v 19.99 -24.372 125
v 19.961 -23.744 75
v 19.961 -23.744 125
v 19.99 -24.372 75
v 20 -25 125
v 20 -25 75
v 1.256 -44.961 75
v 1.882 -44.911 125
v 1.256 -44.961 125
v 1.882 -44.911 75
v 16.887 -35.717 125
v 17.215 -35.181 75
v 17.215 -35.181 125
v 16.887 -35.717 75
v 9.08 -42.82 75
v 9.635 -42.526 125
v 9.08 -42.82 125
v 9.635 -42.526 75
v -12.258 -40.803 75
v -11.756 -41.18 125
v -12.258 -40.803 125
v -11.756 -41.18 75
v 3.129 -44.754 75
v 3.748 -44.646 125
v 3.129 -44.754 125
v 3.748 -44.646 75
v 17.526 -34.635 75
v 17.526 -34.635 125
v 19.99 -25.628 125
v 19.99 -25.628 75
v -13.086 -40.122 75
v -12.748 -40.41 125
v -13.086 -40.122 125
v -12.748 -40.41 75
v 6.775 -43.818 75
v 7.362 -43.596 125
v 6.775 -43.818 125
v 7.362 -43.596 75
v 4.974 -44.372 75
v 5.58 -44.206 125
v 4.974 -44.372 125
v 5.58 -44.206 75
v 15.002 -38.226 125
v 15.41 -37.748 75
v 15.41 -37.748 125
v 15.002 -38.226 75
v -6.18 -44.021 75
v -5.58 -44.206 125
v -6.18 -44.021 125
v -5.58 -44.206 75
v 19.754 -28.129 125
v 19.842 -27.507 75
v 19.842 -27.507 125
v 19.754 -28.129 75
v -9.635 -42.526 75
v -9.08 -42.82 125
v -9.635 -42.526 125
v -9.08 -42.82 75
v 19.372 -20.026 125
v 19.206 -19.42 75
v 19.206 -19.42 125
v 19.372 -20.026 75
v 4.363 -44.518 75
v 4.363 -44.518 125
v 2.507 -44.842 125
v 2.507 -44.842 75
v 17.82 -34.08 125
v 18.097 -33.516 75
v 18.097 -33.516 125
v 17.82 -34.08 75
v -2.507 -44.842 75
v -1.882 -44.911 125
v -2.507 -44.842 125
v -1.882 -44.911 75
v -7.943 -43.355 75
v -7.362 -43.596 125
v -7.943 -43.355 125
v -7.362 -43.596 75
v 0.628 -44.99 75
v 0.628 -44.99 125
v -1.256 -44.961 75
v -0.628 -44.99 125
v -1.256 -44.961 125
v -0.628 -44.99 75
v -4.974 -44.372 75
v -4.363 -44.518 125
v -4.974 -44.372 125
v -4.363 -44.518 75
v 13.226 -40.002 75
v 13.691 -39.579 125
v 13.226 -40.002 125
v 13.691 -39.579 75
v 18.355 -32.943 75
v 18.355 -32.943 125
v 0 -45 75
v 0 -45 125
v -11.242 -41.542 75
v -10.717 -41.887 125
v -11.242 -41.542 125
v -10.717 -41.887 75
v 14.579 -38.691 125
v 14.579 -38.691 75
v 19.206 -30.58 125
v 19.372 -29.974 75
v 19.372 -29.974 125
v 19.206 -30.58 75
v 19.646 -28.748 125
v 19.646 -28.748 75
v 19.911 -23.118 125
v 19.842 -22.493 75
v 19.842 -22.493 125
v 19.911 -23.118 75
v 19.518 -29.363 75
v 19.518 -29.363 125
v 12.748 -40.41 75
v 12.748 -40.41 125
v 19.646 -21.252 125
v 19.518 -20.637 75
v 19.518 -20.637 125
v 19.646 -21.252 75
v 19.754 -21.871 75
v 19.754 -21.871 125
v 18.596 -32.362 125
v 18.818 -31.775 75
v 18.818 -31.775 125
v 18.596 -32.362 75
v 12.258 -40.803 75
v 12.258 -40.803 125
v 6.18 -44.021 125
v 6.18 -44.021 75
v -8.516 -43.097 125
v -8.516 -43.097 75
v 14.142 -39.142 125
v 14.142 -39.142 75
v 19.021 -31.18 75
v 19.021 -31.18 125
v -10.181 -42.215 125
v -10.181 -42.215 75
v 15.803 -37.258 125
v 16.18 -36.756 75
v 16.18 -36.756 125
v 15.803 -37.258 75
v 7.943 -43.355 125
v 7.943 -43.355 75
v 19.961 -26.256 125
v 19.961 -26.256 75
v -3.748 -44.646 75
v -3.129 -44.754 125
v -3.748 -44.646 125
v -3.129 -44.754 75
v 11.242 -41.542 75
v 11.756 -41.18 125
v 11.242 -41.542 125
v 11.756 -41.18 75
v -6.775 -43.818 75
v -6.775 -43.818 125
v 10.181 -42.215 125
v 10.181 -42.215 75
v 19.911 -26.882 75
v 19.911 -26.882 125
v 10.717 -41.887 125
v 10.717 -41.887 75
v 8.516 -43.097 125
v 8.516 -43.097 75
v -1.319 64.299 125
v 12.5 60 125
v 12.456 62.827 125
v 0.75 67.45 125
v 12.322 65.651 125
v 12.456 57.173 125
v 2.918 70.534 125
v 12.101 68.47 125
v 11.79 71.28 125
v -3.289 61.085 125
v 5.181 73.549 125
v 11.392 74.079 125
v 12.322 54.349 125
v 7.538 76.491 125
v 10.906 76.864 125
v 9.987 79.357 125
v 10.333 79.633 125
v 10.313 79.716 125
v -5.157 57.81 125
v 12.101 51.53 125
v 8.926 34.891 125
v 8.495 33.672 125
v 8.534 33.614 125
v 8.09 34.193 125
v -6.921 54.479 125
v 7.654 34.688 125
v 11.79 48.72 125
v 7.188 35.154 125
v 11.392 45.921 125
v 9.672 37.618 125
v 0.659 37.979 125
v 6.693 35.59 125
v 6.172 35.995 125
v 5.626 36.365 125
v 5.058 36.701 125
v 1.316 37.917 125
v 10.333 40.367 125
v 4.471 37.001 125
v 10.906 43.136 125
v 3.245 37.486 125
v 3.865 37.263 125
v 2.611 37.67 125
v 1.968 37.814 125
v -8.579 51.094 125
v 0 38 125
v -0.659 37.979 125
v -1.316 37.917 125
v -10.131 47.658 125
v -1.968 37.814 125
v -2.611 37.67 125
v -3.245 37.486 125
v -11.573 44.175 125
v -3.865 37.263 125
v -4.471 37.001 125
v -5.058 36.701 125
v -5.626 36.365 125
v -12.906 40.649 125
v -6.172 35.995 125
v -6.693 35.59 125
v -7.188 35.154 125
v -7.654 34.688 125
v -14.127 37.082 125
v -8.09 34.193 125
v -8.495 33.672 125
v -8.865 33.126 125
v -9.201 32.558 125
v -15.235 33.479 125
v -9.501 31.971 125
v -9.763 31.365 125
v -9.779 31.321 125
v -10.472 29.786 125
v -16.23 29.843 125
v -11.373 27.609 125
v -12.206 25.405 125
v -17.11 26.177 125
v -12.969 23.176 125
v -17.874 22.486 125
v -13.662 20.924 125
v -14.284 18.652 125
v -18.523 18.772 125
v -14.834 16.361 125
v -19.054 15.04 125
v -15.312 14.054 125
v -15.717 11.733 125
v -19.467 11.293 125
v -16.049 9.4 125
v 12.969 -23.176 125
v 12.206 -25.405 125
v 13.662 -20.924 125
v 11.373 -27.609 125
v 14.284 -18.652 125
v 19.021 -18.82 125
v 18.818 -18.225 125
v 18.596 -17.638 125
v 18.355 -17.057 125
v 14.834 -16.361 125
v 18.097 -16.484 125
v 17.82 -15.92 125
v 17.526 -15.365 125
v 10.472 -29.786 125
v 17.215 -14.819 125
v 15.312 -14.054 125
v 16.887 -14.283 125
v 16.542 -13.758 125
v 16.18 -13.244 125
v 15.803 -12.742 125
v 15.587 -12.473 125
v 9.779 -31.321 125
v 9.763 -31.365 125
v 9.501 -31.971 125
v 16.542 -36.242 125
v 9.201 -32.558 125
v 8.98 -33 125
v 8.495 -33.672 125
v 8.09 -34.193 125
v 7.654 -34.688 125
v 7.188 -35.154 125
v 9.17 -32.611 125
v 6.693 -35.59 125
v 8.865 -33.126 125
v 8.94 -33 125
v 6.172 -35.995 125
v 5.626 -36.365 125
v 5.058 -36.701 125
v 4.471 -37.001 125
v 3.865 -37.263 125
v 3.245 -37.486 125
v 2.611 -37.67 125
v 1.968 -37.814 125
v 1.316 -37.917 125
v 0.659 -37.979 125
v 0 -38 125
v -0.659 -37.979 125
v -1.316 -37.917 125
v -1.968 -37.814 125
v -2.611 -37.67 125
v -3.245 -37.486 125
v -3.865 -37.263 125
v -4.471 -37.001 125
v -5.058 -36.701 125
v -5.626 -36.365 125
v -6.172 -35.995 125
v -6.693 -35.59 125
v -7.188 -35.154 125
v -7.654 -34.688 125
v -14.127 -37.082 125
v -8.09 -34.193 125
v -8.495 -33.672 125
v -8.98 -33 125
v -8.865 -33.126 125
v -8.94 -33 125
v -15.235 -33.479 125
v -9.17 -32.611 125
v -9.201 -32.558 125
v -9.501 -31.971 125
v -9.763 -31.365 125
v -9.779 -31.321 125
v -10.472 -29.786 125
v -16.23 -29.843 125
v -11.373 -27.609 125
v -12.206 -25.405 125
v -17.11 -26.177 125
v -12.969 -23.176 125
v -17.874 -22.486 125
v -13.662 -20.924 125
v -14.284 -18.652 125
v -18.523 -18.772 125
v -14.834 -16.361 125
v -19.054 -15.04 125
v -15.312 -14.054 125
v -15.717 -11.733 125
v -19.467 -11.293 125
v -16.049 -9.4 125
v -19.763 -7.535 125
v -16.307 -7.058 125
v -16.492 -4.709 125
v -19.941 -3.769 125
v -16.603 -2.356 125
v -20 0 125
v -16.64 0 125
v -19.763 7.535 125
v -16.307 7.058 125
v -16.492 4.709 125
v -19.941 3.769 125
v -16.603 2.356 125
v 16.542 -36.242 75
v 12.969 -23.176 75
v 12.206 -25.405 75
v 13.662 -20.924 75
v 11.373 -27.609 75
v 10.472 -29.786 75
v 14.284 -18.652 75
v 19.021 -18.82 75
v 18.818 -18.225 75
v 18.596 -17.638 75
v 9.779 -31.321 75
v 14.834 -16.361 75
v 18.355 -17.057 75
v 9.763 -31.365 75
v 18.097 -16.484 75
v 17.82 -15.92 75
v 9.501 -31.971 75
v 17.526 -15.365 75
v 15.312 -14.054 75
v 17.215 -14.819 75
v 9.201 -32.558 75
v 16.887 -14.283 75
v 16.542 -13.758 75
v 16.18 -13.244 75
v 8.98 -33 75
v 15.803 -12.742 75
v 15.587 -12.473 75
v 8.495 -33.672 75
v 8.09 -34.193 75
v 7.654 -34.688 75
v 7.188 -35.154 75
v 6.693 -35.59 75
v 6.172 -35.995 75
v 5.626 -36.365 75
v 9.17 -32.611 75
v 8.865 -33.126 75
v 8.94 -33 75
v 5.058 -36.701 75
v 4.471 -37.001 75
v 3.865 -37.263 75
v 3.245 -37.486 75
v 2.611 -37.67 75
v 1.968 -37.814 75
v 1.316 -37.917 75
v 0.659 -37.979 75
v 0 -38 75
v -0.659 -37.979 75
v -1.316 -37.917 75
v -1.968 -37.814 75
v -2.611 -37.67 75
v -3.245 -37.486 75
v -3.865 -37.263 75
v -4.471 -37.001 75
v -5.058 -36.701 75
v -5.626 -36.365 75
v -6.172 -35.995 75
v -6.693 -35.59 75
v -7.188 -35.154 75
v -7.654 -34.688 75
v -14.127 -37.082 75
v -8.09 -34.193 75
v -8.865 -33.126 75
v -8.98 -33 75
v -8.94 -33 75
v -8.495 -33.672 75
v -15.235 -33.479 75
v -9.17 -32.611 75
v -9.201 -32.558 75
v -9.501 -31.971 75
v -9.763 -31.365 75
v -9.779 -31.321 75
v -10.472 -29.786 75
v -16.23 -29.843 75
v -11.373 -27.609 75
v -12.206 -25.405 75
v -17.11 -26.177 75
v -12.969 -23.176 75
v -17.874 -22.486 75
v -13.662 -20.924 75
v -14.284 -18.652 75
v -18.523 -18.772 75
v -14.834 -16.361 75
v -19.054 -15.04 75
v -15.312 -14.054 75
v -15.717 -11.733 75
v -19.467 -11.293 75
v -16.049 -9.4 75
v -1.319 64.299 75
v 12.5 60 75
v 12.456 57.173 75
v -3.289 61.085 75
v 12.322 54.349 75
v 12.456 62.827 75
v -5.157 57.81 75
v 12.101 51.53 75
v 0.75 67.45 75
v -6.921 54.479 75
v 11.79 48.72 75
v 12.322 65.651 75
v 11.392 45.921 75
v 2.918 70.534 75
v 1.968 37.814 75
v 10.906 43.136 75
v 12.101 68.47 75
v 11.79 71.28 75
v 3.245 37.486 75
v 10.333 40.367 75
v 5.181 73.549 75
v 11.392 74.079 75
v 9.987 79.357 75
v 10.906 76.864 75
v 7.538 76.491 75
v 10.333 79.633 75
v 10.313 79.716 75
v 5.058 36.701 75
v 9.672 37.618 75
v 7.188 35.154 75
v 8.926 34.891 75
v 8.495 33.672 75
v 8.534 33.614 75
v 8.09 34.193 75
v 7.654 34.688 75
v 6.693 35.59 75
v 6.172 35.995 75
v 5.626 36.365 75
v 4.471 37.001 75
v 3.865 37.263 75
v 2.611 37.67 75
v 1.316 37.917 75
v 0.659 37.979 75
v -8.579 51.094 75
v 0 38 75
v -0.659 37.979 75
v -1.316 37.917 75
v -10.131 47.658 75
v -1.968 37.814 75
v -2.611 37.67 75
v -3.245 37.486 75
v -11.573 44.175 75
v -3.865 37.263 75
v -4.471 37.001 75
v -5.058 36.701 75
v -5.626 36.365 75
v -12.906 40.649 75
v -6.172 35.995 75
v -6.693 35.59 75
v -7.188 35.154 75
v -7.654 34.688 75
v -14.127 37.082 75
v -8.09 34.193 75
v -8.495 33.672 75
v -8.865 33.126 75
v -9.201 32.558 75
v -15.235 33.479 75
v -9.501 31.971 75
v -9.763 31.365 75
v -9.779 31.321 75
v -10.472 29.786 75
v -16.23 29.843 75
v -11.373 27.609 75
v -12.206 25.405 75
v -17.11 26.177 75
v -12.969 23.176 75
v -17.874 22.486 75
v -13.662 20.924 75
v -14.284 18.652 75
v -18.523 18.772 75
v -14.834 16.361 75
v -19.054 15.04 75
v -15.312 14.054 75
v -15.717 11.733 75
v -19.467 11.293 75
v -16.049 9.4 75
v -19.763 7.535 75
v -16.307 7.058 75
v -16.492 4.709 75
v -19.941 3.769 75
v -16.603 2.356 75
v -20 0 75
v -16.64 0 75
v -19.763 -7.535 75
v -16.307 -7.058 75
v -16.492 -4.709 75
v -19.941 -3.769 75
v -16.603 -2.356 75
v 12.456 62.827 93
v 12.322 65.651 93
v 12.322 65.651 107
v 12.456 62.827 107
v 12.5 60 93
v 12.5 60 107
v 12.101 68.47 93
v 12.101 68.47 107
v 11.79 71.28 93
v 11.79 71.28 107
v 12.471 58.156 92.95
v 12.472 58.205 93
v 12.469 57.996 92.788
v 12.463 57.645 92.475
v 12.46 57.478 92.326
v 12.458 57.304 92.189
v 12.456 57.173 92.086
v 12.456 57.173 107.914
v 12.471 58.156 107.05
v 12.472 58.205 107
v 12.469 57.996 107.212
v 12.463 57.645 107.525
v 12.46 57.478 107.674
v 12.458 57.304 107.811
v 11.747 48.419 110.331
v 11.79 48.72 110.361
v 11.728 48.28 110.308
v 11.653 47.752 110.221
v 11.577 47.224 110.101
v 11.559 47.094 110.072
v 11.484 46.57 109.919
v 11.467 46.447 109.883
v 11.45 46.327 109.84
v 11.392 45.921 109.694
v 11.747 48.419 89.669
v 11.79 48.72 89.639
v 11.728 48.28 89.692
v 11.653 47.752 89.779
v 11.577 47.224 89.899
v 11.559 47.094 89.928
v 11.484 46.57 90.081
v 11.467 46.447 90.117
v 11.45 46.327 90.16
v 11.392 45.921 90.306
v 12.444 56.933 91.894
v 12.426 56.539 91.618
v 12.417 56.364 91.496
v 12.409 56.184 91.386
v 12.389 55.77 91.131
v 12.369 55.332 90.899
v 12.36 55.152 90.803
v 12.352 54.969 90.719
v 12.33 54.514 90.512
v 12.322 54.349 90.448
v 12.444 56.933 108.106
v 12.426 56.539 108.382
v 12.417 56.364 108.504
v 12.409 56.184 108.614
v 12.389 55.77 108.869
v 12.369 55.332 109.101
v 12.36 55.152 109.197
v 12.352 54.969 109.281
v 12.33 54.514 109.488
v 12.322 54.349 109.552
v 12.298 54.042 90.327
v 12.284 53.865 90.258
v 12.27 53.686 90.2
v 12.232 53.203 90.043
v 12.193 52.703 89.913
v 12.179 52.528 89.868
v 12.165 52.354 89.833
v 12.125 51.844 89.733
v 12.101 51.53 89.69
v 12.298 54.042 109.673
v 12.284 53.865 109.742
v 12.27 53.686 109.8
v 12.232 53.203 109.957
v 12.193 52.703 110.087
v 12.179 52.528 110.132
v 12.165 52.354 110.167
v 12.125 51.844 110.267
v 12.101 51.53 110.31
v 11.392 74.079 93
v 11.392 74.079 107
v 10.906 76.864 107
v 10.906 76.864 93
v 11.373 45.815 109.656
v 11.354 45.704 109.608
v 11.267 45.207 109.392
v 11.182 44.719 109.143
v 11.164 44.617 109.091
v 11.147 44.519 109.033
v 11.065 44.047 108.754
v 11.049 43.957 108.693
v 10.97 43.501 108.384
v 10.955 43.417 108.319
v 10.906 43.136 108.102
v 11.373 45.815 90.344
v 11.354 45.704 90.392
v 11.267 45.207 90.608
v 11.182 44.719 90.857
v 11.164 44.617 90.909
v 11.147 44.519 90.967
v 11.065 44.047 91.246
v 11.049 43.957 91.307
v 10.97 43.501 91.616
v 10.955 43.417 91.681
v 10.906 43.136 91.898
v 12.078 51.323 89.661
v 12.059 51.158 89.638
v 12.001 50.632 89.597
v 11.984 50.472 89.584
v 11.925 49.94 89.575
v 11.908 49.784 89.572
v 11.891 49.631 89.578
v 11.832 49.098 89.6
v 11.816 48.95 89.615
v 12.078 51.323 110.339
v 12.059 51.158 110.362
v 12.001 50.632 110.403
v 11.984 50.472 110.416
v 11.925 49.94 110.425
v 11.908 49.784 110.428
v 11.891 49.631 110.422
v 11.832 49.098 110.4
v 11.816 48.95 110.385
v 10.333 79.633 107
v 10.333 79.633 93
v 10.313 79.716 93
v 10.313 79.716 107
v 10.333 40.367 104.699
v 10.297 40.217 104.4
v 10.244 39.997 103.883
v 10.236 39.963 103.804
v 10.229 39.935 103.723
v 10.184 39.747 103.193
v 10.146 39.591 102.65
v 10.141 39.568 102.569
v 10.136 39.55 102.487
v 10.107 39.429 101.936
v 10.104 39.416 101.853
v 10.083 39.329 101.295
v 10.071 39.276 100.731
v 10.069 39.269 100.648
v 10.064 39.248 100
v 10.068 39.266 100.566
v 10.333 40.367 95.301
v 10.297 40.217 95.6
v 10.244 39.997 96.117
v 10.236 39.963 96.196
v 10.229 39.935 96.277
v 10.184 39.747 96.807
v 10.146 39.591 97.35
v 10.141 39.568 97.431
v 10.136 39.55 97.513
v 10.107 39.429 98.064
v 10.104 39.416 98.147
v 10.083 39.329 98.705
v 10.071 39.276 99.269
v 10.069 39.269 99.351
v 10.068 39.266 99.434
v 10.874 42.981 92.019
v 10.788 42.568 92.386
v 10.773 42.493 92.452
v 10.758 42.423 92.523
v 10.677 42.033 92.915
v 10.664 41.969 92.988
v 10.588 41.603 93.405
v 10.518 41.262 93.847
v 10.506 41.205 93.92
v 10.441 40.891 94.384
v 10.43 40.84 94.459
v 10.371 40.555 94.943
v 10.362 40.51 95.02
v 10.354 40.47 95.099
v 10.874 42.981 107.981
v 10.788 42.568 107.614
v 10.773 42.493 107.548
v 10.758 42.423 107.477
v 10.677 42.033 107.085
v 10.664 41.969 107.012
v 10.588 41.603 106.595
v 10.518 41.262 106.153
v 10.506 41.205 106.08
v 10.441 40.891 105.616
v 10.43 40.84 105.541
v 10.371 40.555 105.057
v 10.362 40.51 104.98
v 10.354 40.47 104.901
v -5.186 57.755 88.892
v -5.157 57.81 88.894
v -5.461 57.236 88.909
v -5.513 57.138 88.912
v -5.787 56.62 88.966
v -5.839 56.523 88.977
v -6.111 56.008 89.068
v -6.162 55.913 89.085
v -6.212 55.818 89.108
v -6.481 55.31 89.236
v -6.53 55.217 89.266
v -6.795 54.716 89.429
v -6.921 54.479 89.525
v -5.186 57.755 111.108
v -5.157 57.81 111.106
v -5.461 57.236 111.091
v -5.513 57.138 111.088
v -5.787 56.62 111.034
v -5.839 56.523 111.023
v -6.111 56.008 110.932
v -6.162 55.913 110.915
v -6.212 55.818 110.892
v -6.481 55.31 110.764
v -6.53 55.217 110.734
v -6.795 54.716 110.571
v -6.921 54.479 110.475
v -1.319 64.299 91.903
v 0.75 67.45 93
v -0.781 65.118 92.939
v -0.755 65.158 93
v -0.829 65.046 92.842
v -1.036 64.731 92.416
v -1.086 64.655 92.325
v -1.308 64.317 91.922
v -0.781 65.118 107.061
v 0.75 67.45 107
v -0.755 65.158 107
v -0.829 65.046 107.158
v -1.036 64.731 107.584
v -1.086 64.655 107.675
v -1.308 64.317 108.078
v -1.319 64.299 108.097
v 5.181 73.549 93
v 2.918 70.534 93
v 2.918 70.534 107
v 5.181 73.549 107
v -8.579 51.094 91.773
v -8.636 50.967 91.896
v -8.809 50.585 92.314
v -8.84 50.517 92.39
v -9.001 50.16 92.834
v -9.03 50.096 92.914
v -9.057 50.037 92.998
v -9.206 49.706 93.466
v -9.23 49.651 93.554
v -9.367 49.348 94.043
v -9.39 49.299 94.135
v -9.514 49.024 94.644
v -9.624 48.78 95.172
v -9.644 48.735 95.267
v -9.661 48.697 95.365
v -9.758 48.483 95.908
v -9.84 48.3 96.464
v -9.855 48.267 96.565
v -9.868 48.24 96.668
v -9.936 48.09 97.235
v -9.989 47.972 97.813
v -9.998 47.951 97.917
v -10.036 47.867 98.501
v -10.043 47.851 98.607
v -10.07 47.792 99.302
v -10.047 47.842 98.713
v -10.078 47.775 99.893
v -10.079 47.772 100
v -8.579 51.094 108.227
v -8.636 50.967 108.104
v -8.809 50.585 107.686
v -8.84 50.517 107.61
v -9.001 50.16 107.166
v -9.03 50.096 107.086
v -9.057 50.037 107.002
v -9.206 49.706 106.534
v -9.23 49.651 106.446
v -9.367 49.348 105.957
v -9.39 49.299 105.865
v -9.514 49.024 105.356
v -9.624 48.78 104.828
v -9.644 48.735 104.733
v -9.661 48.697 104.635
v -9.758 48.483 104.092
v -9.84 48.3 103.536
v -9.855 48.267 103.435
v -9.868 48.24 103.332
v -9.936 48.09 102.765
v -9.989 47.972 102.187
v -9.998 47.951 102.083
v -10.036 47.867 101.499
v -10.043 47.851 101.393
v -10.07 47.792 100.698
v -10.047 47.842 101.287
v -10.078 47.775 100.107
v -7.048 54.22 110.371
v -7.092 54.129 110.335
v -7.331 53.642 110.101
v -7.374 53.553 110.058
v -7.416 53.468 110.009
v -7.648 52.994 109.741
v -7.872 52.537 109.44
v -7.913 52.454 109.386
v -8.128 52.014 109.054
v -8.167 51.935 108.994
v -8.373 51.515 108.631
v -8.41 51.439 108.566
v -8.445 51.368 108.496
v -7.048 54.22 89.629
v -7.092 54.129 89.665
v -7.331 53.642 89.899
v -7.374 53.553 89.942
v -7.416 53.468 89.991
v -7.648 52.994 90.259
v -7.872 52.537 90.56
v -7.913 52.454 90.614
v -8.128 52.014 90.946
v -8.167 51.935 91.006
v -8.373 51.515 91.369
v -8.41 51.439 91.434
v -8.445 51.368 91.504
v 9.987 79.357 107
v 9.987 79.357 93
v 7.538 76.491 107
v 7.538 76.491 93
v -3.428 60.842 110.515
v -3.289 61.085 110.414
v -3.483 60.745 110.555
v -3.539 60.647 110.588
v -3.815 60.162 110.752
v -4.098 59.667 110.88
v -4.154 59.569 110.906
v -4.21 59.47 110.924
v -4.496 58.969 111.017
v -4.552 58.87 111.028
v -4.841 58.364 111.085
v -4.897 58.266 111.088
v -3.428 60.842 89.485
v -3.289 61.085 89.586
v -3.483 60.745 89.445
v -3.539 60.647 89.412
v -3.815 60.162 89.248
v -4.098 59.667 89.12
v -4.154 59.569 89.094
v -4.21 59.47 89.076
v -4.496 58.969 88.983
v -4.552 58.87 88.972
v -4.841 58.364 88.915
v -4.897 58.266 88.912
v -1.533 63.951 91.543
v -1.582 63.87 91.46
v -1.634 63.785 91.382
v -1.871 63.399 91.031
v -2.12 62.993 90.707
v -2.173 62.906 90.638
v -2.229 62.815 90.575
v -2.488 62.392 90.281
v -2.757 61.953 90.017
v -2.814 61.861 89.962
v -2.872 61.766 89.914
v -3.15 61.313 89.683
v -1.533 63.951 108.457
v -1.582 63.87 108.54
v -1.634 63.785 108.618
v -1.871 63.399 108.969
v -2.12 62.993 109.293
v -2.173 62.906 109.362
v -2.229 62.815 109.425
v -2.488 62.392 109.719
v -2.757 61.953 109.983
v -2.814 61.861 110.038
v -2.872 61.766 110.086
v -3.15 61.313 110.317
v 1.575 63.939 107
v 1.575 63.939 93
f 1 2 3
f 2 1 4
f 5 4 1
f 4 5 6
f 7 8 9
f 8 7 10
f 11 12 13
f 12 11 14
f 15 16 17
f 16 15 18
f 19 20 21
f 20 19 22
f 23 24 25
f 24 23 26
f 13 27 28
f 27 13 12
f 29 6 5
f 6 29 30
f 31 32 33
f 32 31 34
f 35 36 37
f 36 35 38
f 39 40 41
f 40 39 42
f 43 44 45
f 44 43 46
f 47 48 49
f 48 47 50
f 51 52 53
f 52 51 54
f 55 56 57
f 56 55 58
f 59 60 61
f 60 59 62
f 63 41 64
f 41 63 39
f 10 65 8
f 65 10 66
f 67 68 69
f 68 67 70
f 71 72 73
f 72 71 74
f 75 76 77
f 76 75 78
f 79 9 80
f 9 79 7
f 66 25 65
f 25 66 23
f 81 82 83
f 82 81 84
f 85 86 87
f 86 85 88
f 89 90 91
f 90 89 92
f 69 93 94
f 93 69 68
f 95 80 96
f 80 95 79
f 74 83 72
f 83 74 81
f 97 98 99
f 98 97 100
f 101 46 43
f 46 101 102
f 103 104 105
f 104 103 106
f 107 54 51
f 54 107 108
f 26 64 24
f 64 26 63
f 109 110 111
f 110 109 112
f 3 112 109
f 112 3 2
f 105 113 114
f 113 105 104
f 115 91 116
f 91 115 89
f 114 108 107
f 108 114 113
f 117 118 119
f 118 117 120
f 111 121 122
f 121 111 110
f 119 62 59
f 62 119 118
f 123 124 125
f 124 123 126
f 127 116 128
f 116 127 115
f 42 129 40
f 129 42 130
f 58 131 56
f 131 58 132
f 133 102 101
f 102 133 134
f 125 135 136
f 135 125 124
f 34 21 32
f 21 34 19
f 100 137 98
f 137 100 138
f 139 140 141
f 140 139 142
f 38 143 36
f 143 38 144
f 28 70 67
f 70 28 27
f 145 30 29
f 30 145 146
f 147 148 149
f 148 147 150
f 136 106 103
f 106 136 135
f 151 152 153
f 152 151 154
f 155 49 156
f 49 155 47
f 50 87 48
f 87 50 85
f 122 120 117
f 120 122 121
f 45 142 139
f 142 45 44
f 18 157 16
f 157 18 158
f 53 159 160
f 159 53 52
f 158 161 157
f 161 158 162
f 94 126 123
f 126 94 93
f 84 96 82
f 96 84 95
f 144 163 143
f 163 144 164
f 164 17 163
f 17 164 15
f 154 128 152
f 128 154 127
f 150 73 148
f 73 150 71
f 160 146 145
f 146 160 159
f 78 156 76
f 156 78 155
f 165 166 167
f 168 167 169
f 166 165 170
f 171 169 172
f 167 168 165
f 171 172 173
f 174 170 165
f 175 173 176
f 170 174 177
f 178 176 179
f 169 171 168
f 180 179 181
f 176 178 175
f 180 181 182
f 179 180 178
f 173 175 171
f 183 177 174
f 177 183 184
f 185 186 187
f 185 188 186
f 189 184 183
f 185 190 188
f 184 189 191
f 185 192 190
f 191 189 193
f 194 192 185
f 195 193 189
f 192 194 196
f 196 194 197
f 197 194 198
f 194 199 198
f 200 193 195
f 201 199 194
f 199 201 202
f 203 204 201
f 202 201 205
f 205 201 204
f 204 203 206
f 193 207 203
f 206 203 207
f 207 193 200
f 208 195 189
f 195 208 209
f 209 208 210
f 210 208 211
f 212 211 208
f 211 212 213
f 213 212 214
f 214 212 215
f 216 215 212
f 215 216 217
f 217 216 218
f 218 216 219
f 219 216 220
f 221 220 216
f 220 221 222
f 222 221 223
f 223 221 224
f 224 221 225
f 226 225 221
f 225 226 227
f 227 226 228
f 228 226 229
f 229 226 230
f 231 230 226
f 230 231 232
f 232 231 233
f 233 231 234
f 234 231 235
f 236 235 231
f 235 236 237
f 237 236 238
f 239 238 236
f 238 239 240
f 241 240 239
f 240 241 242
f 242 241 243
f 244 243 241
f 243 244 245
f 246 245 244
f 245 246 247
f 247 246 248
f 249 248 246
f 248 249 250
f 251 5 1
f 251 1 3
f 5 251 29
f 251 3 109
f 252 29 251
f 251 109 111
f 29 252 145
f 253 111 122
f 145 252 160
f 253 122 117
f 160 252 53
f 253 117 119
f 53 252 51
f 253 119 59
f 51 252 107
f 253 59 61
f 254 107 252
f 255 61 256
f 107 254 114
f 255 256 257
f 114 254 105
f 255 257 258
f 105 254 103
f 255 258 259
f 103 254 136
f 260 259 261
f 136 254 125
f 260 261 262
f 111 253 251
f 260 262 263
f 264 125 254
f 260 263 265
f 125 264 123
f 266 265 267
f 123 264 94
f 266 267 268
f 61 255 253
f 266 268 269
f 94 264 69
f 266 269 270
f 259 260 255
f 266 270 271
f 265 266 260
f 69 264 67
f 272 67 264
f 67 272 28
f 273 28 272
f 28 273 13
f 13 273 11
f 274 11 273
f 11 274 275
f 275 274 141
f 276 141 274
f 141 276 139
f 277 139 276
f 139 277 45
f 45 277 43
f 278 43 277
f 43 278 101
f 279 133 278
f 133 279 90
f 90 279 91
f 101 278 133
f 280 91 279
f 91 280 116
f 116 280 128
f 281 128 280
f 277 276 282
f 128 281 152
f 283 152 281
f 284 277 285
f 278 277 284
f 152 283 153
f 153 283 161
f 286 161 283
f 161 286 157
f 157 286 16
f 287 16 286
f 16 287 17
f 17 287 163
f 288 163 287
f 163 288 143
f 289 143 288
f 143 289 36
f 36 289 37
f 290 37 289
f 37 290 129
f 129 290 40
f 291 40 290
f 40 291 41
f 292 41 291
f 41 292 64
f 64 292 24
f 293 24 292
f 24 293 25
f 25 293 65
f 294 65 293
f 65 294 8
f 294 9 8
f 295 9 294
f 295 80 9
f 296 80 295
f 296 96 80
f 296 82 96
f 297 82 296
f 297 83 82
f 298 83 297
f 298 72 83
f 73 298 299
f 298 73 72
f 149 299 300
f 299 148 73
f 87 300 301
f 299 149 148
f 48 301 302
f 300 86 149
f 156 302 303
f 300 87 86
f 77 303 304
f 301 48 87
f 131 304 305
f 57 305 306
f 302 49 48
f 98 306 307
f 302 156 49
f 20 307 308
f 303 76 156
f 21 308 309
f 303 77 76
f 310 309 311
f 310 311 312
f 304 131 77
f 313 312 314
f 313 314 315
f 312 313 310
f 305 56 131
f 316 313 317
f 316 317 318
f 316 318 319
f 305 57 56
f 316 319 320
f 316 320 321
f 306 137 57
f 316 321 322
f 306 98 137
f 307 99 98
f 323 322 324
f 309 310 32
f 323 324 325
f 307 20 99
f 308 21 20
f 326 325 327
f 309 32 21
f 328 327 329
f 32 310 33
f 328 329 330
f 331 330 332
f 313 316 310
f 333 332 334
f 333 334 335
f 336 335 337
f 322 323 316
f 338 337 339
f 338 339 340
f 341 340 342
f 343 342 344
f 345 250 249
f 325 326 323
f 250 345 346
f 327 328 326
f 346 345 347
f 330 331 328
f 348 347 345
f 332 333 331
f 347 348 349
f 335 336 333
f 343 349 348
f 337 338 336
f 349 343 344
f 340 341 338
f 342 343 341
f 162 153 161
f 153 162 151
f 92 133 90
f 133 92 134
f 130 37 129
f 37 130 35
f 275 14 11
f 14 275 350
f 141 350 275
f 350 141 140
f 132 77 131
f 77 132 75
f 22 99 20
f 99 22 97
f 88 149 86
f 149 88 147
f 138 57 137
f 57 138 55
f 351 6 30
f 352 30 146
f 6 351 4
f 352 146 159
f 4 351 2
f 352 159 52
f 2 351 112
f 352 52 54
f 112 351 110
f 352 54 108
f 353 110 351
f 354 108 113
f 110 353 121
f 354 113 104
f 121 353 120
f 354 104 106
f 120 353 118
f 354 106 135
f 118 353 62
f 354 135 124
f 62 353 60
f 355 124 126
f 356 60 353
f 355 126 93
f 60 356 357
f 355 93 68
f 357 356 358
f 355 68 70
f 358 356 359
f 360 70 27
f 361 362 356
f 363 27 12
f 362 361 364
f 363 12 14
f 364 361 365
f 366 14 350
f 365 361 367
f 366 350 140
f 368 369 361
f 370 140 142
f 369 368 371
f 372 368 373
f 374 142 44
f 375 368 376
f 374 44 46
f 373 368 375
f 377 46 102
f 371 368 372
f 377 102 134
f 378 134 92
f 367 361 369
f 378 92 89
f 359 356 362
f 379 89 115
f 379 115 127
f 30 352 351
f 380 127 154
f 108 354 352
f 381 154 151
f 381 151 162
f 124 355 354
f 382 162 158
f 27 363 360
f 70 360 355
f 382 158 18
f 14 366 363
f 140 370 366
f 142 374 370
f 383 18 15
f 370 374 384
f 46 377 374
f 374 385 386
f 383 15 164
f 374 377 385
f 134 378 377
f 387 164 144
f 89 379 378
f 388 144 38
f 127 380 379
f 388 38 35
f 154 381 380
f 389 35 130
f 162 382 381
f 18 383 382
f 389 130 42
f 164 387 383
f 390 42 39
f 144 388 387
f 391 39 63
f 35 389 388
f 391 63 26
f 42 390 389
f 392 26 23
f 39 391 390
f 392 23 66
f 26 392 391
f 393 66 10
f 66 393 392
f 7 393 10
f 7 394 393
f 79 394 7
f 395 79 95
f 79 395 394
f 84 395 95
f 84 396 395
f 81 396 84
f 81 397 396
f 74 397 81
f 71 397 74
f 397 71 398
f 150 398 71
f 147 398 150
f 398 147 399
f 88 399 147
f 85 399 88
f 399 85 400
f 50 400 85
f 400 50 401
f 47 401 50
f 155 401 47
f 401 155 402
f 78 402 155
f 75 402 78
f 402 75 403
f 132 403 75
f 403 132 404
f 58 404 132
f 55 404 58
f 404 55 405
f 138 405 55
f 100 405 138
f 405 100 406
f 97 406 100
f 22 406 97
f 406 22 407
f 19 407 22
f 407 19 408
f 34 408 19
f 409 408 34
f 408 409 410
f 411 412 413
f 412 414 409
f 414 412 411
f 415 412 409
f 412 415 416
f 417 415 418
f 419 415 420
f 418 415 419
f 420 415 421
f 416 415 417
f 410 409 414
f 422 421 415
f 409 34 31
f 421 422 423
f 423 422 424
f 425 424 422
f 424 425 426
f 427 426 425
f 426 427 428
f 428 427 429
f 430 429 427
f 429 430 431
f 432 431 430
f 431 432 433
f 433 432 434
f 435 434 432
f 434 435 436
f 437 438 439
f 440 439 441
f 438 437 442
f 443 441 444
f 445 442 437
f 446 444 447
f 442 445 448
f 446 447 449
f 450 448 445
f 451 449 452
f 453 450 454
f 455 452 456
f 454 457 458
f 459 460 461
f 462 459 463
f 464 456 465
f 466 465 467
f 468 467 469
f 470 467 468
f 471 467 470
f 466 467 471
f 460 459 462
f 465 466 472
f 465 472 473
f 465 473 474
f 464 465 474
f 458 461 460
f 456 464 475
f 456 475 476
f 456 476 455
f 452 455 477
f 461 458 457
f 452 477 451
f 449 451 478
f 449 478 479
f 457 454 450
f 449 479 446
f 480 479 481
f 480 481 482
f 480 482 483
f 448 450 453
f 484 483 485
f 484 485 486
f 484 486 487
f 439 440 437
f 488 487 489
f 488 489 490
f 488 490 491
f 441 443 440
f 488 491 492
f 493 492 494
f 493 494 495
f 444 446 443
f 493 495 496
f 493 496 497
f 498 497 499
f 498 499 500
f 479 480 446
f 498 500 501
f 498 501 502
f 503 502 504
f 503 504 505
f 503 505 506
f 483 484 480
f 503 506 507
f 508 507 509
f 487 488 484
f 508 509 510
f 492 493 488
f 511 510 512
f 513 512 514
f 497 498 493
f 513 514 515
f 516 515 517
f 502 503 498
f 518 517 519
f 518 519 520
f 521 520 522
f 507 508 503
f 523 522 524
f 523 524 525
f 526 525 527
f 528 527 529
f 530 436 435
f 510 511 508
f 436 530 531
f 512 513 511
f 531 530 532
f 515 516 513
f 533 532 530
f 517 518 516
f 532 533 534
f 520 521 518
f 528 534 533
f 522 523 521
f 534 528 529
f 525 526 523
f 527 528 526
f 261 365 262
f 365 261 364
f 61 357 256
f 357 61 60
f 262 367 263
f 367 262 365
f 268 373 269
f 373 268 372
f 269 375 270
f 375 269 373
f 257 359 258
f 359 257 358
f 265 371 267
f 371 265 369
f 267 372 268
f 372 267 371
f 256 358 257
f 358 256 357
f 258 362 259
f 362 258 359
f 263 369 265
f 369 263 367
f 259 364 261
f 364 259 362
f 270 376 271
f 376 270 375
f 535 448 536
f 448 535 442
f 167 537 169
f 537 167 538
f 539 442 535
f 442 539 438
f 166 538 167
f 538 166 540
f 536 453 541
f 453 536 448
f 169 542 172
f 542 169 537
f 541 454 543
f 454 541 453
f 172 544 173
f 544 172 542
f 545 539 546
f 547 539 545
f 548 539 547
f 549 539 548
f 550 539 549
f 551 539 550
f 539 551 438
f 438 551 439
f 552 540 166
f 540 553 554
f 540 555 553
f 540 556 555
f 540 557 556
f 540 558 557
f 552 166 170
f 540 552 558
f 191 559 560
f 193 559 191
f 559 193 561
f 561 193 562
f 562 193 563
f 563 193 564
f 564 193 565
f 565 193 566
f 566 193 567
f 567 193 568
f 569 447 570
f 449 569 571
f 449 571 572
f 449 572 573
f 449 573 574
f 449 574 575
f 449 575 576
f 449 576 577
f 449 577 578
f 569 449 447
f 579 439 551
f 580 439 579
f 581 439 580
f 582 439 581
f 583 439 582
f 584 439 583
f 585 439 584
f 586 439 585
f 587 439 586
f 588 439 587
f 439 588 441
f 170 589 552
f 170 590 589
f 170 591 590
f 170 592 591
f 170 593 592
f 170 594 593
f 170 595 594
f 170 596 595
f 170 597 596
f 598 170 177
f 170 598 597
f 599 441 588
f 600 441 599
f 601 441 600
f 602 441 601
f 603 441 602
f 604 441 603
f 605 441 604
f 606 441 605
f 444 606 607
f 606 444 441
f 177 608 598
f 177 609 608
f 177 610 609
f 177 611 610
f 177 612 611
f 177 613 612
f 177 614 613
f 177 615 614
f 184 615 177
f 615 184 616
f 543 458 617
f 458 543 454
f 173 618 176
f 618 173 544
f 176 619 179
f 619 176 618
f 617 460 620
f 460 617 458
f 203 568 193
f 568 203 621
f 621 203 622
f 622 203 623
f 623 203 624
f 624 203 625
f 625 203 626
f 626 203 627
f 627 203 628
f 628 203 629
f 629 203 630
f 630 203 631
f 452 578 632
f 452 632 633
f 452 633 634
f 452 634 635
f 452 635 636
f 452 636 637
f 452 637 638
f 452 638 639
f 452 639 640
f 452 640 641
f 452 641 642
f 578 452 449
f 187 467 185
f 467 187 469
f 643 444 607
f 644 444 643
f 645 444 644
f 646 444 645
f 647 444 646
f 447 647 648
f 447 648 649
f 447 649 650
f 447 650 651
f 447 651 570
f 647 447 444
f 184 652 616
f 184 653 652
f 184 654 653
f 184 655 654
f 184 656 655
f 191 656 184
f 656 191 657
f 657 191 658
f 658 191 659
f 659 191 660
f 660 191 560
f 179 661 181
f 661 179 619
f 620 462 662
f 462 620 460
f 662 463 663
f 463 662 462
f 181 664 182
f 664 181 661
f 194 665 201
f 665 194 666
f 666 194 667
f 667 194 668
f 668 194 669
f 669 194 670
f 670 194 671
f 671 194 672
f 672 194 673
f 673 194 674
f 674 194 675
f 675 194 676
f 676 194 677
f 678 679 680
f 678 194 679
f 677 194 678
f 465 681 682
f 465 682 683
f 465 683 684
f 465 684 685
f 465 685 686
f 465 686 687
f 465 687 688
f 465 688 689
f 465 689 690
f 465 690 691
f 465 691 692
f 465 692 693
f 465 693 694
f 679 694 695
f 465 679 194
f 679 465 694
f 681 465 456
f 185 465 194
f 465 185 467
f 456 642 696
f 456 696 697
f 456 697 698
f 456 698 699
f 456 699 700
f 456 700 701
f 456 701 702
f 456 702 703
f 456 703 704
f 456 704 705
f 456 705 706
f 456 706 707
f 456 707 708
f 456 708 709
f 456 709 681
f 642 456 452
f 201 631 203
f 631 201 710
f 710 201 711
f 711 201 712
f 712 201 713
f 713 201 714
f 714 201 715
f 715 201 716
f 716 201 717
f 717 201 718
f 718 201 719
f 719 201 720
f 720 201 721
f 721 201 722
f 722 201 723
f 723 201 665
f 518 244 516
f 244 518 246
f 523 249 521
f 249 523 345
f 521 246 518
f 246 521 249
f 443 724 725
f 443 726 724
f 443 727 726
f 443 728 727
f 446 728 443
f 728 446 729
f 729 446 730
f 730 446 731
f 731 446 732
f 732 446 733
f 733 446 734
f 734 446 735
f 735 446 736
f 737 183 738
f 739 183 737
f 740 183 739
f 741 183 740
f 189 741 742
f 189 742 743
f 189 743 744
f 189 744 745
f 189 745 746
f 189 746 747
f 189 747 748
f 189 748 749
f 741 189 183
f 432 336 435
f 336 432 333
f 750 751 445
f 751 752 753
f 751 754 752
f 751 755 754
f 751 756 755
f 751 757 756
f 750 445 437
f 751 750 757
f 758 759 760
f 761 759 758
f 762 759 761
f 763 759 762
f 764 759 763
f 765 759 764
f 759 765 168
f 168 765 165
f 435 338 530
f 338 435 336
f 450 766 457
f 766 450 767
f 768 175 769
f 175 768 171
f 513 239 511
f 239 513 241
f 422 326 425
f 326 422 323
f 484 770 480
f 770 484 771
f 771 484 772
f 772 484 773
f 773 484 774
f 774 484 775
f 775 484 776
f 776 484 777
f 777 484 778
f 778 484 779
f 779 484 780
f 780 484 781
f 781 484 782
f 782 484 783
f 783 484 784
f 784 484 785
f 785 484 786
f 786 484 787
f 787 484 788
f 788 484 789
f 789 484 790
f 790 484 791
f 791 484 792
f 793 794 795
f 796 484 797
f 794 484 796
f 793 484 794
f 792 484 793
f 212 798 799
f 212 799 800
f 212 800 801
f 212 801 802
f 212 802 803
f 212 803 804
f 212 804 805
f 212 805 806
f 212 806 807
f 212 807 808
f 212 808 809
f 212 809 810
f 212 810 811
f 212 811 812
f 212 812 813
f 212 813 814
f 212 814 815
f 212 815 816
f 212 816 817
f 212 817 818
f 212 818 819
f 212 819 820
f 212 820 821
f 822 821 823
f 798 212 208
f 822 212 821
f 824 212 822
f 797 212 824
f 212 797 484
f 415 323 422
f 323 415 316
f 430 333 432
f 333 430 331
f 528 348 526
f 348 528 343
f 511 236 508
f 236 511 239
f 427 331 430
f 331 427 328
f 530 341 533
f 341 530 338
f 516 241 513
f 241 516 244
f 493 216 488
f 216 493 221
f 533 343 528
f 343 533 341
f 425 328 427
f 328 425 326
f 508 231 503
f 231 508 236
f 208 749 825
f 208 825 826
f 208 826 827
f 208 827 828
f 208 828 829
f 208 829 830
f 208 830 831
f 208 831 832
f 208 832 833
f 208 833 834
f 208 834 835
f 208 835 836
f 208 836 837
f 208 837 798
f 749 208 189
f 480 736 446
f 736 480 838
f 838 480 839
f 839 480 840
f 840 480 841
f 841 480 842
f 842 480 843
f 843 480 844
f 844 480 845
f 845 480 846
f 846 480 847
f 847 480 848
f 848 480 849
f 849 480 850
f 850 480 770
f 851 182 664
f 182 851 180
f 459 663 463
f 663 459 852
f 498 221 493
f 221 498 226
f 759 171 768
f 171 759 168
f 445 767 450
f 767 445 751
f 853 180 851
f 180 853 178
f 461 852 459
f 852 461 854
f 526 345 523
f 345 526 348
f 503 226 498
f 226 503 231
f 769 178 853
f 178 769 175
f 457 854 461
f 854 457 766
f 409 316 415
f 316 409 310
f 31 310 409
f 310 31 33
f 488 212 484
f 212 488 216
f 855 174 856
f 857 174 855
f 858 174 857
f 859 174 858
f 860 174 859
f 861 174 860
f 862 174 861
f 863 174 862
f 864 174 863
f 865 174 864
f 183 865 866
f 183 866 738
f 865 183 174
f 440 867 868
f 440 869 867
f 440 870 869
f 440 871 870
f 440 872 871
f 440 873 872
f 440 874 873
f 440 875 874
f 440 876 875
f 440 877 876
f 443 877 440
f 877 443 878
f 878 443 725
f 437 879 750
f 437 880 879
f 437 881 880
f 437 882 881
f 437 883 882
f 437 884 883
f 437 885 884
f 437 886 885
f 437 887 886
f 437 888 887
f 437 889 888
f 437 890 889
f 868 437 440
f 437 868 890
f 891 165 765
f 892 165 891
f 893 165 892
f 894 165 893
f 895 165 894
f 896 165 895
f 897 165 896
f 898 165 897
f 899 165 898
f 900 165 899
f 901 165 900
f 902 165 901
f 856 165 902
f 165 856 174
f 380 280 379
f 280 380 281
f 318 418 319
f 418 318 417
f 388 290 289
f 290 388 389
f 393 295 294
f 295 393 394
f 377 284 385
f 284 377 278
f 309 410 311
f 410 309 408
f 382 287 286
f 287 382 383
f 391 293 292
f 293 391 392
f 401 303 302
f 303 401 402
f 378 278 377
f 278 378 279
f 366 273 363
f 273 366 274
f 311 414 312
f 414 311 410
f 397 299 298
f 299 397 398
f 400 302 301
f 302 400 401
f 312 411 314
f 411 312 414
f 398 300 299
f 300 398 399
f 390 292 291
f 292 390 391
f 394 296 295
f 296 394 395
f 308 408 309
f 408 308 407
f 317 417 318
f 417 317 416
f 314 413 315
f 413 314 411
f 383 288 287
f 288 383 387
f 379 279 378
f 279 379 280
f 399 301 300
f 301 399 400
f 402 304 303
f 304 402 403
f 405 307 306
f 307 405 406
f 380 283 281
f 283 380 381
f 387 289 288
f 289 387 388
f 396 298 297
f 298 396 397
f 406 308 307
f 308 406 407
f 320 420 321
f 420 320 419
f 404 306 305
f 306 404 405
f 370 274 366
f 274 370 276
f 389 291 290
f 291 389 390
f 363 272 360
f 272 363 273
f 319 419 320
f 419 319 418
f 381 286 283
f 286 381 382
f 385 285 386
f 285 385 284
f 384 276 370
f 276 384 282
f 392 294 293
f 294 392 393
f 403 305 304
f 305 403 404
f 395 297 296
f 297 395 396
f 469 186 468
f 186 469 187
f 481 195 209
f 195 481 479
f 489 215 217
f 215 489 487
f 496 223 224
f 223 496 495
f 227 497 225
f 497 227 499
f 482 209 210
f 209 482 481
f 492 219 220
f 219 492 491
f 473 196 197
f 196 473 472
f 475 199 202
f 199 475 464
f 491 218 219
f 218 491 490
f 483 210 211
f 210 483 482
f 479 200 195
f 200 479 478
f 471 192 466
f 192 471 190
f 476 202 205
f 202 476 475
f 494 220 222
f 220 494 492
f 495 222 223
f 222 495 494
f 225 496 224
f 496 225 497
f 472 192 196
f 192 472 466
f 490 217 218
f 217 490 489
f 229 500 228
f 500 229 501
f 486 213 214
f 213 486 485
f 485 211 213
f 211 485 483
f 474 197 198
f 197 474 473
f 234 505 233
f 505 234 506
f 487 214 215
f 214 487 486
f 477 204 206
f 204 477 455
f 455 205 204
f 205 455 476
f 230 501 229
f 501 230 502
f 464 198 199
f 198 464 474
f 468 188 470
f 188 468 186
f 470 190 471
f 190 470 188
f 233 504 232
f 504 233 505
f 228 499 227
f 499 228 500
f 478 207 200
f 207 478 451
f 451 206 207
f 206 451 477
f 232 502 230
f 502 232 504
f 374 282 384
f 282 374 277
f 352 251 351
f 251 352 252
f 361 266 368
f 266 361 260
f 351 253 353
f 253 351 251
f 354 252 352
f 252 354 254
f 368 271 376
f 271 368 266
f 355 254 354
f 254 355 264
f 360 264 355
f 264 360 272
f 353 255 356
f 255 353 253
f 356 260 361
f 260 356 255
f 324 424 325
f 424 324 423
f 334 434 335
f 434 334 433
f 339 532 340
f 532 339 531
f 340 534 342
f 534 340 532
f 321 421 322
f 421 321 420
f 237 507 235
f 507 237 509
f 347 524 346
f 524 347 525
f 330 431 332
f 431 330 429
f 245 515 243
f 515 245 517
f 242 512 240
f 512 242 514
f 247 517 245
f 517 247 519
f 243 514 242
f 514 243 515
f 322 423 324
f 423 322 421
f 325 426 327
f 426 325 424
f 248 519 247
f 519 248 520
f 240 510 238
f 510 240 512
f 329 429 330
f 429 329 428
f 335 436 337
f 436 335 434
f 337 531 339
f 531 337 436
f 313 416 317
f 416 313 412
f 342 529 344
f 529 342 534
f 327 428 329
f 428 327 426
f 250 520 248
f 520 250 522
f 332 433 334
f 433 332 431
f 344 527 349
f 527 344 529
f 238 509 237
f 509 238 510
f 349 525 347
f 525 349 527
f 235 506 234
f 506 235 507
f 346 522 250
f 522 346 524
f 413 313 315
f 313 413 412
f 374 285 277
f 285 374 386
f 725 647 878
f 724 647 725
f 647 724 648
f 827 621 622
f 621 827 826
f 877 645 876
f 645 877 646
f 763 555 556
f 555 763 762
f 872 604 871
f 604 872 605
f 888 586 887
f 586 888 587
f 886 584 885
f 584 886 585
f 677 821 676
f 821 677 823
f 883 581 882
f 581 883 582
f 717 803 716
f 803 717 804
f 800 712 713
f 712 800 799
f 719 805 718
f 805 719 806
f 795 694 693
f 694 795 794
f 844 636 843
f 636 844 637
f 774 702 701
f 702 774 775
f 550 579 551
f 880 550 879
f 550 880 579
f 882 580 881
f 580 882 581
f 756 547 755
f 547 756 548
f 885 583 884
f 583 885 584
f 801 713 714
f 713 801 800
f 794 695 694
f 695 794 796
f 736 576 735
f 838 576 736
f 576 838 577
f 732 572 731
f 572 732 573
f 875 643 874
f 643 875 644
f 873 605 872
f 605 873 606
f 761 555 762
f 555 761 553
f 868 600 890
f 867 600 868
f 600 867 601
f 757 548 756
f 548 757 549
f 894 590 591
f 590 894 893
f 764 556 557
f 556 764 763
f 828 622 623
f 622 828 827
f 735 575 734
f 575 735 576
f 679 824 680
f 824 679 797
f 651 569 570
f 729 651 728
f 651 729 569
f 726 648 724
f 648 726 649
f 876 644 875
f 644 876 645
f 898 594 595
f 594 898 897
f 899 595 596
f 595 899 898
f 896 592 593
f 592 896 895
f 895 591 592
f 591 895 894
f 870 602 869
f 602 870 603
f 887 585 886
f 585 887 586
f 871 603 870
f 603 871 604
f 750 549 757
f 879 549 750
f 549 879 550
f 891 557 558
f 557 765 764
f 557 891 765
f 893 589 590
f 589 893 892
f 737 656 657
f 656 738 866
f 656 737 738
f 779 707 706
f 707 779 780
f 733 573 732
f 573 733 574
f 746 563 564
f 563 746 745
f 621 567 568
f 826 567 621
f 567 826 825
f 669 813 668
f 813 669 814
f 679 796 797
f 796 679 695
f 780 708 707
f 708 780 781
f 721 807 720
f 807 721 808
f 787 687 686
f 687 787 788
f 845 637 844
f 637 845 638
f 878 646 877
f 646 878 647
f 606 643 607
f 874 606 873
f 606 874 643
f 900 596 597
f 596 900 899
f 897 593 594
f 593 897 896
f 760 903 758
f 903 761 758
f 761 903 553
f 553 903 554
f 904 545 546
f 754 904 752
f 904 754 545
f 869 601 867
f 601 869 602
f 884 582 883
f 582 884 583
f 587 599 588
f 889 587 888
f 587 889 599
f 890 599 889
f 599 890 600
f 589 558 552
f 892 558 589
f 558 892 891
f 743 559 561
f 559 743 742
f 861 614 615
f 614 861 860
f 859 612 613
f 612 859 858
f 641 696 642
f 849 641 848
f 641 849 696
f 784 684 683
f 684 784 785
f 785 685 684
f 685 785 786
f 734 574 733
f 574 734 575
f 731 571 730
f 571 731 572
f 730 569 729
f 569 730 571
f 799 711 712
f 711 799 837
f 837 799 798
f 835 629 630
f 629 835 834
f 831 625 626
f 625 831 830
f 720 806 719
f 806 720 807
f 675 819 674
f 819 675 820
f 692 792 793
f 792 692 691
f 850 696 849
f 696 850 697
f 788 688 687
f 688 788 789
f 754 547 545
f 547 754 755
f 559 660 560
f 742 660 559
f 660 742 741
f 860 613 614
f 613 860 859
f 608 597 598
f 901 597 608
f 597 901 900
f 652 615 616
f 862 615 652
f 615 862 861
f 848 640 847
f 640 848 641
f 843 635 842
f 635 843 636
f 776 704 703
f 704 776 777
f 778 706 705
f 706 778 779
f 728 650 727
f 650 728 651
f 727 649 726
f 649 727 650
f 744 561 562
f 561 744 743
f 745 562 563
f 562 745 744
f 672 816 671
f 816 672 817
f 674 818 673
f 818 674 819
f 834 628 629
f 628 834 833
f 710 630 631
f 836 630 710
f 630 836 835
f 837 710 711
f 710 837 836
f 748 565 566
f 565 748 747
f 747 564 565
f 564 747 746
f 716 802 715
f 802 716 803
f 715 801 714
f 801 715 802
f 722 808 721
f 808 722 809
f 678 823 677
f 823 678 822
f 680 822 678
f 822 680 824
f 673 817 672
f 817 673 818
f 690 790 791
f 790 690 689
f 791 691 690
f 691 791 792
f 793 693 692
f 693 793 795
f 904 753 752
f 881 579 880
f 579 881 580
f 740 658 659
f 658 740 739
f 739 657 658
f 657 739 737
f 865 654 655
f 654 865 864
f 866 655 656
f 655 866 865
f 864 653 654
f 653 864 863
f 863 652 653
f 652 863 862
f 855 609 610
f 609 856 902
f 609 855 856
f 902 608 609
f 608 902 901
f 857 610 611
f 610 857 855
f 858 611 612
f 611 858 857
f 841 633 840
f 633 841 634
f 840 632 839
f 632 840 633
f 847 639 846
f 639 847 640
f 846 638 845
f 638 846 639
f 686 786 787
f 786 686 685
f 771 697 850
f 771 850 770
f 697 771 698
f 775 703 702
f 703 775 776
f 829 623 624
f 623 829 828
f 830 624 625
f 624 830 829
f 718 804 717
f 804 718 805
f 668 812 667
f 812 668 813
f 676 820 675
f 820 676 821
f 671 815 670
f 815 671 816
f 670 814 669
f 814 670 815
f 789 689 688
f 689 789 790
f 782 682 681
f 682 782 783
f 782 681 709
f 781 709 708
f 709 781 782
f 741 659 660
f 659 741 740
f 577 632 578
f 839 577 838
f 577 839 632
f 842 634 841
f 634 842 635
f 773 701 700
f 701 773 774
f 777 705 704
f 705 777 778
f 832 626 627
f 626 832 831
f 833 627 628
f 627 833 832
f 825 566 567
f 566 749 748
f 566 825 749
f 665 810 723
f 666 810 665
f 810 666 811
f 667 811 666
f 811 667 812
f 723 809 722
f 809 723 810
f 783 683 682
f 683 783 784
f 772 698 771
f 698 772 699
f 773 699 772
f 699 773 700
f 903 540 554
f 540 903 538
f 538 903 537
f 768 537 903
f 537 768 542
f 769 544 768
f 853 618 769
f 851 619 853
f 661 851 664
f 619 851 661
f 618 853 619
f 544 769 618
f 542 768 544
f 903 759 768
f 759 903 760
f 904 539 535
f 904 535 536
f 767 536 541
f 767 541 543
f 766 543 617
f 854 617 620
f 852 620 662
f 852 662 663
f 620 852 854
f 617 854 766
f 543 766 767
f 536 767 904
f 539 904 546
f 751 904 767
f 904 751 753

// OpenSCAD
difference(){
union(){
	intersection(){
		union(){
			translate([0,-25,75])cylinder(r = 20, h = 50, $fn = 200);
			translate([-35,-20,75])cube([55,120,50]);
		}
		intersection(){
		translate([100,0,75])cylinder(r = 120, h = 50, $fn = 200);
		union(){
			translate([-50,-50,75]) cube([58,130,50]);
			translate([0,-25,75])cylinder(r = 20, h = 50, $fn = 200);
			translate([-77.5,60,75])cylinder(r = 90, h = 50, $fn = 200);	
		}}
	}
translate([0,-27.5,0])cylinder(r = 10.5, h = 200, $fn = 100);
translate([0,27.5,0])cylinder(r = 10.5, h = 200, $fn = 100);
}

union(){
	intersection(){
		translate([-58.36,0,0])cylinder(r = 75, h = 200, $fn = 200);
		translate([58.36,0,0])cylinder(r = 75, h = 200, $fn = 200);
		translate([-17,-33,0]) cube([34,65,200]);
	}
}
translate([0,-27.5,0])cylinder(r = 10.5, h = 200, $fn = 100);
translate([0,27.5,0])cylinder(r = 10.5, h = 200, $fn = 100);
translate([-10,60,100]) {rotate(a = [25,90,0]) cylinder(r1 = 11.3, r2 = 10.2, h = 30.5, $fn = 100);}
translate([0,47,93]){rotate(a = [0,0,25])cube([30,50,14]);}
}
